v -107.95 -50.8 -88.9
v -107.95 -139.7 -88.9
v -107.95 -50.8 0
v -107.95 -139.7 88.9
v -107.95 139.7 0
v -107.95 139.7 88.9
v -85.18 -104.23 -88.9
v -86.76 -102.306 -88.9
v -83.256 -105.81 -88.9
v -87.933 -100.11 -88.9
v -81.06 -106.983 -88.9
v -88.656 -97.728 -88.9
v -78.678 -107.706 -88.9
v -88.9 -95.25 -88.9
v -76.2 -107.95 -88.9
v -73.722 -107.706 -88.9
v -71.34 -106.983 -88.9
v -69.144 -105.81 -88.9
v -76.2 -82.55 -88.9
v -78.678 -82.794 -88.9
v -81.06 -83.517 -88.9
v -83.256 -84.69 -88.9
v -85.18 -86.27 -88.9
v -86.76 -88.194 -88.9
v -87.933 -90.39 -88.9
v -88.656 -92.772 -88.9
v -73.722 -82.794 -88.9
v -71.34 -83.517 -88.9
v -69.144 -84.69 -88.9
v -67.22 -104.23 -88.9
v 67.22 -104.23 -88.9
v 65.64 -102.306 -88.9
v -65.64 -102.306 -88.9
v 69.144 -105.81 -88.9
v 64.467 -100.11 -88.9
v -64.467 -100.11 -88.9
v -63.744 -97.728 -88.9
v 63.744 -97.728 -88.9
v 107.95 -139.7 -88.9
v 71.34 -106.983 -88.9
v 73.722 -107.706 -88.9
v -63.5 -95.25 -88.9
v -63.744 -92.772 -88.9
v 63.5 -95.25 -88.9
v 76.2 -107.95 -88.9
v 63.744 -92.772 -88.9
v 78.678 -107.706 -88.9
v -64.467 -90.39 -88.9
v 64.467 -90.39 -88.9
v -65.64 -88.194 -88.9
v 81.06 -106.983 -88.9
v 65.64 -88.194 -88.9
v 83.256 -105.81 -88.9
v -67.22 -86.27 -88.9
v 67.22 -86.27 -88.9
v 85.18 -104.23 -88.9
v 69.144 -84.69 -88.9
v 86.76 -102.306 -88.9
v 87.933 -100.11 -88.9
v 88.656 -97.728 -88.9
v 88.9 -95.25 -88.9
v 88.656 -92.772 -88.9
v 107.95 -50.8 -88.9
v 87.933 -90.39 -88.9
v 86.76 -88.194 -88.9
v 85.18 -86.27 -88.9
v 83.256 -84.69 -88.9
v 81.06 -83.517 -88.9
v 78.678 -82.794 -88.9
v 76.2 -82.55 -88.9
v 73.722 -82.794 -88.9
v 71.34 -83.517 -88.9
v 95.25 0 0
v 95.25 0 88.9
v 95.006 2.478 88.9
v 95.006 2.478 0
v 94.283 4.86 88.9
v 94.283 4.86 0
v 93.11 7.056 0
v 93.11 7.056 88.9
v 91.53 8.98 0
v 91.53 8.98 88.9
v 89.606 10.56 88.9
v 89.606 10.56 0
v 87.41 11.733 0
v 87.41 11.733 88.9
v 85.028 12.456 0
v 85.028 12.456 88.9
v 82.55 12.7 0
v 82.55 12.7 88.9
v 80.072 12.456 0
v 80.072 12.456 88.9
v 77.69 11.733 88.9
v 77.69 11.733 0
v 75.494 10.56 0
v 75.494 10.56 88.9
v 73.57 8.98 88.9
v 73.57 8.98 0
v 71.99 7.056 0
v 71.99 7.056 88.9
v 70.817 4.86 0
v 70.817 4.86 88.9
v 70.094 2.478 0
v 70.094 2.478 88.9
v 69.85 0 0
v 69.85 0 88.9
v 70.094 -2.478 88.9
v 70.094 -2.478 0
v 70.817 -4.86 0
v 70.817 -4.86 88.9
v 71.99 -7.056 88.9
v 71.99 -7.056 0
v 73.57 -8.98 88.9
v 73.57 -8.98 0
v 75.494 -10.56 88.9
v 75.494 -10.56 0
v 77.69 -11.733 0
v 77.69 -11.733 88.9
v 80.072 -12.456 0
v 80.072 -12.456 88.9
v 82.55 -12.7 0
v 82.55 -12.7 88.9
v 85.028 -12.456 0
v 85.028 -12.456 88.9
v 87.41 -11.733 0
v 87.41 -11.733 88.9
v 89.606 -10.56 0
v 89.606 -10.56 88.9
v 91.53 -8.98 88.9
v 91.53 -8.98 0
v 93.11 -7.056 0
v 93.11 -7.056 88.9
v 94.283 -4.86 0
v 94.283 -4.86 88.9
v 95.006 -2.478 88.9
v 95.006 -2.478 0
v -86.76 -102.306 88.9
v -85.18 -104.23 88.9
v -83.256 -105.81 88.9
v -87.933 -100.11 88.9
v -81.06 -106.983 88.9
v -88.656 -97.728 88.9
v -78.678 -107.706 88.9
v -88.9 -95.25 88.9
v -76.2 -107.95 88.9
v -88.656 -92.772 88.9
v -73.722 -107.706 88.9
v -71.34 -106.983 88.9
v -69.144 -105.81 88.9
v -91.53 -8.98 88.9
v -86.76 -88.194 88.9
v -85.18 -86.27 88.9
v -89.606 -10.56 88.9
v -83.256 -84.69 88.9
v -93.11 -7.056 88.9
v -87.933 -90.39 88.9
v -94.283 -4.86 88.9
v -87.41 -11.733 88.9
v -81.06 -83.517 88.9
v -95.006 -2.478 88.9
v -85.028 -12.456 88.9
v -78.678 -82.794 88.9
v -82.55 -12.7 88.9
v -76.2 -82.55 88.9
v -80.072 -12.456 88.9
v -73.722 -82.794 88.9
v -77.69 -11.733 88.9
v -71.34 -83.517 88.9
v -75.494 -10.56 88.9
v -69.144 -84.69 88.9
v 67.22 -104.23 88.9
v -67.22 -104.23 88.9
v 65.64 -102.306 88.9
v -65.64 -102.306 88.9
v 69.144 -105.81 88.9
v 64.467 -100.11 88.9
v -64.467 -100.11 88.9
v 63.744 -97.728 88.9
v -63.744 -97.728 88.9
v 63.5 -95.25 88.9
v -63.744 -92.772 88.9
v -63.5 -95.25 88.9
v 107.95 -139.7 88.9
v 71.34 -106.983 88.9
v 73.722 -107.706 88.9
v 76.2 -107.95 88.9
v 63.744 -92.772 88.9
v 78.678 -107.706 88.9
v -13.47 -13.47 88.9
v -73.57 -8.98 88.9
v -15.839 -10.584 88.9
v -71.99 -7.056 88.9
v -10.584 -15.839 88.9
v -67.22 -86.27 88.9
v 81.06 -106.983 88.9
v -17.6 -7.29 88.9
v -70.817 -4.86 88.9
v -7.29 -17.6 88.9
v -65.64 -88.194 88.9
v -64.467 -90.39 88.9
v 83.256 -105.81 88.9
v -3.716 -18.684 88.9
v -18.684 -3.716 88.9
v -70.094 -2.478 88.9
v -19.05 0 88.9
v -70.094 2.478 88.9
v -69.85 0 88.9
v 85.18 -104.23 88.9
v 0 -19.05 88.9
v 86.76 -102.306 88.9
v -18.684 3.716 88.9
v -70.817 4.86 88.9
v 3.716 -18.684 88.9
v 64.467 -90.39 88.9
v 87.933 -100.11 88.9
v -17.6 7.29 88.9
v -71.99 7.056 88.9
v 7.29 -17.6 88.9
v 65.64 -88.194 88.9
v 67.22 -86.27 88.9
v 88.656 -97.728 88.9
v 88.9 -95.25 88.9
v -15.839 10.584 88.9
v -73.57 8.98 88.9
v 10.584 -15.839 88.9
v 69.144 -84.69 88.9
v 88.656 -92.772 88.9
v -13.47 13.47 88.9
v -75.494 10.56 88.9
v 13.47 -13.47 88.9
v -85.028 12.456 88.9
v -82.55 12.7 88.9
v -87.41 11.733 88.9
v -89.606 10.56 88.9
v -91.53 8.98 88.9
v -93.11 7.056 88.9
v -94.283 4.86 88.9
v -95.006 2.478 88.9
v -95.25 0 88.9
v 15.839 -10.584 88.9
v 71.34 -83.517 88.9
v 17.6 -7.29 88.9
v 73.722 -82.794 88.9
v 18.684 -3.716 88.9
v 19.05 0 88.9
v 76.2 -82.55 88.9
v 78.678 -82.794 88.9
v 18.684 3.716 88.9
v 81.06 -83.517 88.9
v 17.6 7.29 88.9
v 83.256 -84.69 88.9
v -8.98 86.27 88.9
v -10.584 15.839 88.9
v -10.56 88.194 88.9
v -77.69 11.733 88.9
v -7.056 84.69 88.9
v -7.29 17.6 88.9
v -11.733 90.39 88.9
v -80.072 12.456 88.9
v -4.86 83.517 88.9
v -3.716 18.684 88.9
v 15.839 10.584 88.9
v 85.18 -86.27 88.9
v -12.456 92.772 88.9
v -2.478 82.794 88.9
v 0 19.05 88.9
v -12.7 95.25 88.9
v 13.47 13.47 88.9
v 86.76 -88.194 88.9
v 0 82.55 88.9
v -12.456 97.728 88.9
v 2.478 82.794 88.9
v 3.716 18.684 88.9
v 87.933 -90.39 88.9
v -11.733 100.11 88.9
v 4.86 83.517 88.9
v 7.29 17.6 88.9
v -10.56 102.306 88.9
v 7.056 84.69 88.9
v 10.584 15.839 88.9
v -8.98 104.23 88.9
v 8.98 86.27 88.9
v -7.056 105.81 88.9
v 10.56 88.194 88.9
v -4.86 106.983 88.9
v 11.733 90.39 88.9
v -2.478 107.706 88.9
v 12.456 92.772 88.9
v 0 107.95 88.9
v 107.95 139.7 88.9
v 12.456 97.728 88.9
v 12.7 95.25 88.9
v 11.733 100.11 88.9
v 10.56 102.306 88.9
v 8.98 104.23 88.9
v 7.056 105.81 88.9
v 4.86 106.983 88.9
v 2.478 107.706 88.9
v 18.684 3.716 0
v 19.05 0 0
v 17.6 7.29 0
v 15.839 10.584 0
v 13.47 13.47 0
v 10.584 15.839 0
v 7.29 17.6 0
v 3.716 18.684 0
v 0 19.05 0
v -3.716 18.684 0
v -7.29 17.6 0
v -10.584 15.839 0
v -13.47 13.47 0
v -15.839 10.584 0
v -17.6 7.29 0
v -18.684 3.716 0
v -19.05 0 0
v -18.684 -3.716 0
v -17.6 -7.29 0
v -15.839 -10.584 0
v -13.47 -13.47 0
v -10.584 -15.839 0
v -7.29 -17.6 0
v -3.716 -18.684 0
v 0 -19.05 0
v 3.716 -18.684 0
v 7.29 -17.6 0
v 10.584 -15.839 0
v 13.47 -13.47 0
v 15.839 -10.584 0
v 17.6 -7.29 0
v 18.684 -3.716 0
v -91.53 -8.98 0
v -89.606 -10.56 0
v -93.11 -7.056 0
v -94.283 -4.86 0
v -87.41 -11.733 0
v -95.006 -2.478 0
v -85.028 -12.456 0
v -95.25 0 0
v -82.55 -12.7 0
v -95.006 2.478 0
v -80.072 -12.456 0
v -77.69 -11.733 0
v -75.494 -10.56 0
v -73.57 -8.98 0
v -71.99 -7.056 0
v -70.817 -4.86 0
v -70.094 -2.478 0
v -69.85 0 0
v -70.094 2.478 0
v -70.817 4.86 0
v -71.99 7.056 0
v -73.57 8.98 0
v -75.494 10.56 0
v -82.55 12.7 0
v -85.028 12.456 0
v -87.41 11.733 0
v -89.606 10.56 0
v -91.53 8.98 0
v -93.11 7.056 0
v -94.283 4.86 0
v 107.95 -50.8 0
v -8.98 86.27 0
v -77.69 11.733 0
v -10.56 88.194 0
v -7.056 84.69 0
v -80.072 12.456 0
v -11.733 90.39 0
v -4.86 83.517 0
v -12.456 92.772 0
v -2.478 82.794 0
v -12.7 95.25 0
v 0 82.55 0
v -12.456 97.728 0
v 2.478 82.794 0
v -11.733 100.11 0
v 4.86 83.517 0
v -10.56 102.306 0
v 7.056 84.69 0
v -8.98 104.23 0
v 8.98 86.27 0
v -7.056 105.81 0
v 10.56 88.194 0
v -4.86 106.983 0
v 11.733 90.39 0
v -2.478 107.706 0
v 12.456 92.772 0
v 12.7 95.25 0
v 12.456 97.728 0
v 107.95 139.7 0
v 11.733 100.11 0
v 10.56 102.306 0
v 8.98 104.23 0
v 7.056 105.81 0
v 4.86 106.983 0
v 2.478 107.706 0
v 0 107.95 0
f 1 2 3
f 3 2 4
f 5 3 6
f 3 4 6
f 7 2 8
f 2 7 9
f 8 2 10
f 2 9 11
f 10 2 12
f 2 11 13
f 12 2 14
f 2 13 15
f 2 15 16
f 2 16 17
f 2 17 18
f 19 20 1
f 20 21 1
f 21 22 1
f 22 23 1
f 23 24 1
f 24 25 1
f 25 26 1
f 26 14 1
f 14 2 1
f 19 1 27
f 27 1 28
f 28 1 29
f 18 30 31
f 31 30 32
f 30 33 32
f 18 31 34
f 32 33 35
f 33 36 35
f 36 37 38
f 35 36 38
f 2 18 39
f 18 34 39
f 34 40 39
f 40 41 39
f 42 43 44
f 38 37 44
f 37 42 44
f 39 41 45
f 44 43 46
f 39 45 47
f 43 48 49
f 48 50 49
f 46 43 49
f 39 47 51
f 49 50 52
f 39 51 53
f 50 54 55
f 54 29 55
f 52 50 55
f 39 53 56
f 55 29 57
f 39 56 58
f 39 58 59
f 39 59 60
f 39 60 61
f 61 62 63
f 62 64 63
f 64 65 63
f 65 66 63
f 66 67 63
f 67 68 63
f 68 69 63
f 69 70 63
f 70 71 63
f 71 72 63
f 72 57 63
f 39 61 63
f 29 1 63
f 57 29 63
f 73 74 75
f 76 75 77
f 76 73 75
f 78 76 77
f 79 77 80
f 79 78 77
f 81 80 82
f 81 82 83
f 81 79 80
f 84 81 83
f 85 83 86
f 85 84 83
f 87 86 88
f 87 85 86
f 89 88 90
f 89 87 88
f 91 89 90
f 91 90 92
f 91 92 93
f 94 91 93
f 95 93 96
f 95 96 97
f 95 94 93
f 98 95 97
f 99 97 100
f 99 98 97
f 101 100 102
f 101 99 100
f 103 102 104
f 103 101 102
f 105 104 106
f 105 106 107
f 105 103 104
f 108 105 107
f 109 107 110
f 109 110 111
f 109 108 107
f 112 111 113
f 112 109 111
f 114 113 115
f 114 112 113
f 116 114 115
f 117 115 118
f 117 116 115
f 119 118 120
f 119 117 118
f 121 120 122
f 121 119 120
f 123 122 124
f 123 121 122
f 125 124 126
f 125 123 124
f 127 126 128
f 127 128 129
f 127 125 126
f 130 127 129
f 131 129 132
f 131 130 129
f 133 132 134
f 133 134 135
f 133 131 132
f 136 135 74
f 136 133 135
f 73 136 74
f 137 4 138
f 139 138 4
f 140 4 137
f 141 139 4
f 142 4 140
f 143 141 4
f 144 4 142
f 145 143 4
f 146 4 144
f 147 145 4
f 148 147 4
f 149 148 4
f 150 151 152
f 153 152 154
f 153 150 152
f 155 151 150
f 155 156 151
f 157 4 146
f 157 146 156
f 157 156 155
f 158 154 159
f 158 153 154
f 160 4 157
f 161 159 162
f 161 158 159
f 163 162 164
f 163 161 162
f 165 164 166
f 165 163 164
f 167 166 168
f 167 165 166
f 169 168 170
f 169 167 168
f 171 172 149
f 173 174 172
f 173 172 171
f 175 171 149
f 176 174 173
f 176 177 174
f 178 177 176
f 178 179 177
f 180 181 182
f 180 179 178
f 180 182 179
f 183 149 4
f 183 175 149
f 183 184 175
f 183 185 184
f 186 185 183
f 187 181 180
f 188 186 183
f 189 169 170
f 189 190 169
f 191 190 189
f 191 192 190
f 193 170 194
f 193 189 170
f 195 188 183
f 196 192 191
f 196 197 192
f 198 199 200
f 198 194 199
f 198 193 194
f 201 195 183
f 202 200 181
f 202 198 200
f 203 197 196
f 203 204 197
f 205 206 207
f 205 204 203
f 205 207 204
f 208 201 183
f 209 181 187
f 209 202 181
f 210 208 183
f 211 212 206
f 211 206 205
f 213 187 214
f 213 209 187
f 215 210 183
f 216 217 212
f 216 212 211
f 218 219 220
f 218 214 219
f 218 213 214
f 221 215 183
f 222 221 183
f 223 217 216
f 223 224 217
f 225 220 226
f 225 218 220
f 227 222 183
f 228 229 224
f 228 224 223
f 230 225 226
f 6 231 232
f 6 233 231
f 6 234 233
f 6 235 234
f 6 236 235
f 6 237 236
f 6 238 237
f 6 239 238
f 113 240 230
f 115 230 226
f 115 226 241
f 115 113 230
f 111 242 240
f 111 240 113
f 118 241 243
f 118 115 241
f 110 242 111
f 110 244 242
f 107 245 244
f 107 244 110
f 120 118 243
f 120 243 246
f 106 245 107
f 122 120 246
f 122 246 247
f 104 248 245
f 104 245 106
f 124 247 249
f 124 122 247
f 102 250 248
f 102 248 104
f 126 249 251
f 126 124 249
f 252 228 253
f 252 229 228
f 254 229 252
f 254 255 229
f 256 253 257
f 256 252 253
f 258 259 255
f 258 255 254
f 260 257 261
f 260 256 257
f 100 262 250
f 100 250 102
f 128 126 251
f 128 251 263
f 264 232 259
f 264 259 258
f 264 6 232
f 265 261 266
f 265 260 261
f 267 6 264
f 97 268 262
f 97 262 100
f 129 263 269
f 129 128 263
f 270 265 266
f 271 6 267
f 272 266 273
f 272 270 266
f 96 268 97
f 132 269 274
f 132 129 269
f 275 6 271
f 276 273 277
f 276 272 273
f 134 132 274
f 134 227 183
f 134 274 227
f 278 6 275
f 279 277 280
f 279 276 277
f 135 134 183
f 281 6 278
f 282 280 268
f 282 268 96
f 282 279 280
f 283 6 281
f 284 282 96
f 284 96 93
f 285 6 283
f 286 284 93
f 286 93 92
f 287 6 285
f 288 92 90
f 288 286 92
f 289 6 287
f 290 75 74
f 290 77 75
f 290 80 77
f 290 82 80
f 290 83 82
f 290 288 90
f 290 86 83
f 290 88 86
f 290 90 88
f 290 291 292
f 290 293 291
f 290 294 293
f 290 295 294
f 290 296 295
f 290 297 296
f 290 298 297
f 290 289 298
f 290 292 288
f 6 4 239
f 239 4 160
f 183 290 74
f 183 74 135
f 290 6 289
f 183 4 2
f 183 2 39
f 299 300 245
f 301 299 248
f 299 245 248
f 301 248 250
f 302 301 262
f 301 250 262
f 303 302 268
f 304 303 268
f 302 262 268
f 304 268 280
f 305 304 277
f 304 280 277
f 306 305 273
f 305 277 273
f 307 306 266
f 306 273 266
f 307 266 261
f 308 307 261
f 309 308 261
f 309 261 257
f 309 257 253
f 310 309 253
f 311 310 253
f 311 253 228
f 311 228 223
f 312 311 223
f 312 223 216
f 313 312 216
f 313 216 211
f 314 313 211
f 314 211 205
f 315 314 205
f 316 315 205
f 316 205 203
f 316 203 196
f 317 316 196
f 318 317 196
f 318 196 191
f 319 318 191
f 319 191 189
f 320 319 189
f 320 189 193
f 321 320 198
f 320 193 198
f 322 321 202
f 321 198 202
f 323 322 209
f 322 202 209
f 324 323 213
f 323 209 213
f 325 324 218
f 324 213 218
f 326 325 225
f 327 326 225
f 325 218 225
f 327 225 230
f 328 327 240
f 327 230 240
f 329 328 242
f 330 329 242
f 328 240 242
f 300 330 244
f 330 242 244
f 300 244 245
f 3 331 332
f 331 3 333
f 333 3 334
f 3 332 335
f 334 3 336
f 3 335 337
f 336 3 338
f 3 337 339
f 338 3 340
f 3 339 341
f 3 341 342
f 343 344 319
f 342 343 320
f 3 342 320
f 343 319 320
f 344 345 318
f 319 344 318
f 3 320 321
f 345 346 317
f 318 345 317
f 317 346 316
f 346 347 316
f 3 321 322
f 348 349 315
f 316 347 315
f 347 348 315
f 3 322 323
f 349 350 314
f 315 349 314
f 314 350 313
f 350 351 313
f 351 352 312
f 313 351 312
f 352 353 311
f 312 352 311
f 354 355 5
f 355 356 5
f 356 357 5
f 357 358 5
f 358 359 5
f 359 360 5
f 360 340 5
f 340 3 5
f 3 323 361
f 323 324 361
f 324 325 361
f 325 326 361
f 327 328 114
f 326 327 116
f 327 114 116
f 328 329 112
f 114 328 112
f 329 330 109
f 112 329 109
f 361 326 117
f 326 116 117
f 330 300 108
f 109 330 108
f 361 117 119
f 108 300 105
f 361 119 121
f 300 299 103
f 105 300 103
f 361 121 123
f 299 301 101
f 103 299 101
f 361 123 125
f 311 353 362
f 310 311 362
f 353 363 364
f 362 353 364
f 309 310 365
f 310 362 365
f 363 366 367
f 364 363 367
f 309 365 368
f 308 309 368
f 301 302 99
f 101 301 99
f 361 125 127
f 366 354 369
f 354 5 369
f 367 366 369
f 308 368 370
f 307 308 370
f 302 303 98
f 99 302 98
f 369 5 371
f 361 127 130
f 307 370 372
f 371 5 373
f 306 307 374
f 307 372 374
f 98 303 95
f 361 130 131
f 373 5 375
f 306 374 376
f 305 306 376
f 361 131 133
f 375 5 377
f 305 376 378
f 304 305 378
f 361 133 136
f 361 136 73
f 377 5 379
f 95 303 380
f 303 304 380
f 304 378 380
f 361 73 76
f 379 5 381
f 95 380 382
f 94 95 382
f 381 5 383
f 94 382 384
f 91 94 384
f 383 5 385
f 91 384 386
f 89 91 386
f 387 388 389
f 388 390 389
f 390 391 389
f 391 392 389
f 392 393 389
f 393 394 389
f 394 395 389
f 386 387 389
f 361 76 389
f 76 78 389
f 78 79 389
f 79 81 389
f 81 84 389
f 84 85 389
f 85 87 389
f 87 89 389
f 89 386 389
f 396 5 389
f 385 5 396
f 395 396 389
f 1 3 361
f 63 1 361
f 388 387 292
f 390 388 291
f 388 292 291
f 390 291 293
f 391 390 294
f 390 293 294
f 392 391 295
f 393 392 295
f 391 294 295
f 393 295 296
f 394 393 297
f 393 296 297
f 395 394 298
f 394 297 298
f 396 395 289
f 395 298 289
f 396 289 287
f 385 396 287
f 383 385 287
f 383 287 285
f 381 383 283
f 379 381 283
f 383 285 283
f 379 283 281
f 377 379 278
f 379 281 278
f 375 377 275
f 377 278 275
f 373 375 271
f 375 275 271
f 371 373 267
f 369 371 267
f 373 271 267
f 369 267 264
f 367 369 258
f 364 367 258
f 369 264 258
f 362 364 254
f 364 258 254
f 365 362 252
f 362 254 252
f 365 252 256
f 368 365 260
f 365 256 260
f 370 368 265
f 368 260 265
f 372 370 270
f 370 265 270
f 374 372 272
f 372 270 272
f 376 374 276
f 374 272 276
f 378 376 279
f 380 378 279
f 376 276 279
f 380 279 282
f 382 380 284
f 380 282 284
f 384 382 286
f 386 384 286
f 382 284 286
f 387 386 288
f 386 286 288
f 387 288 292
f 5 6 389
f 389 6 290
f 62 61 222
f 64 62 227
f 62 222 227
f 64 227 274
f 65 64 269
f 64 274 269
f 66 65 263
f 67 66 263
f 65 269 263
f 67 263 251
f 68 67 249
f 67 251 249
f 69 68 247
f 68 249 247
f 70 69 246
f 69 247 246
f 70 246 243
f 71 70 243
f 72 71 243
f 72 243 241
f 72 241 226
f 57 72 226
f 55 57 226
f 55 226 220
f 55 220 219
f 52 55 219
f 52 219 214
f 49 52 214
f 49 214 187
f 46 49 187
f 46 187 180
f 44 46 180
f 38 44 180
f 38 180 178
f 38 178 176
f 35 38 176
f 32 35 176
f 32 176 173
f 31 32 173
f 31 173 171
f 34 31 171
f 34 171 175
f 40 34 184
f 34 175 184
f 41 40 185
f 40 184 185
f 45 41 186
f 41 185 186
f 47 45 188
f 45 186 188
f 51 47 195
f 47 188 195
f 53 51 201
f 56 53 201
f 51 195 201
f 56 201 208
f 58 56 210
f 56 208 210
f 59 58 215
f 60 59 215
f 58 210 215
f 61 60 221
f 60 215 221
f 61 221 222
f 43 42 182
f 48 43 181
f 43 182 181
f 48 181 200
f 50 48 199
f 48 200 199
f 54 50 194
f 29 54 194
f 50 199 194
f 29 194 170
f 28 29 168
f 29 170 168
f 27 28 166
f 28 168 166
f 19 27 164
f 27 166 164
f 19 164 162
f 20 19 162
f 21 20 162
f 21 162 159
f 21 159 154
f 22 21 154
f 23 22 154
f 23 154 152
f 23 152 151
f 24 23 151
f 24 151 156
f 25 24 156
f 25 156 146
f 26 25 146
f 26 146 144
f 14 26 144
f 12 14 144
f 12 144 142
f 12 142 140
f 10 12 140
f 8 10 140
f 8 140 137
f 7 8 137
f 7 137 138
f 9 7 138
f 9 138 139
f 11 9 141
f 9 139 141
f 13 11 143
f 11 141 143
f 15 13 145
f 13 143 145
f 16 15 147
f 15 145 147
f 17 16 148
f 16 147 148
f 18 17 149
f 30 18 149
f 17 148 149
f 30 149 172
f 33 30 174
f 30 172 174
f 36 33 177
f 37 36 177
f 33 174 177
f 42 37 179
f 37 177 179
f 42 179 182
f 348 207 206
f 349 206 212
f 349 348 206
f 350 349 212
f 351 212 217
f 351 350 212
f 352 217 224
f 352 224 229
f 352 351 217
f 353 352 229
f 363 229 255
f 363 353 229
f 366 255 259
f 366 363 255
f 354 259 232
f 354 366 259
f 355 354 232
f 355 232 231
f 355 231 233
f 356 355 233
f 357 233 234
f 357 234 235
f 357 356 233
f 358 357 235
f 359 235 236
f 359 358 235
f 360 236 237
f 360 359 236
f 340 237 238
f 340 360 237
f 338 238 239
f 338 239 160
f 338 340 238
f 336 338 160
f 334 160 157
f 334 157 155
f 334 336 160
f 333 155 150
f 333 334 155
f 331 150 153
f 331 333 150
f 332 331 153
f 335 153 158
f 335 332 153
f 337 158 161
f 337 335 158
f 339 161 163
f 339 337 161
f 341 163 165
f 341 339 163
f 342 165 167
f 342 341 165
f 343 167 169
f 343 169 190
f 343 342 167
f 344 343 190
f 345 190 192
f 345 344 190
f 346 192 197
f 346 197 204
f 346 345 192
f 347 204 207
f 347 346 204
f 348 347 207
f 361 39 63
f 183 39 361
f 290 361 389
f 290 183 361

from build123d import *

# Parameters (mm, degrees)
SKETCH1_W           = 215.9
SKETCH1_H           = 101.6
SKETCH1_R           = 12.7
SKETCH1_H_2         = 88.9
BOSS_EXTRUDE1_DEPTH = 88.9
SKETCH1_3_W         = 215.9
SKETCH1_3_H         = 88.9
BOSS_EXTRUDE2_DEPTH = 88.9
SKETCH2_W           = 215.9
SKETCH2_H           = 88.9
SKETCH2_R           = 12.7
BOSS_EXTRUDE3_DEPTH = 88.9
CUT_EXTRUDE1_REACH  = 252.564
SKETCH2_3_R         = 12.7
SKETCH2_3_R_2       = 19.05


with BuildPart() as part:
    # Sketch1 → Boss-Extrude1 (new body)
    # profile 1 of 2: a face of its own
    with BuildSketch(Plane.XY):
        Rectangle(SKETCH1_W, SKETCH1_H)
        with Locations((82.55, 0)):
            Circle(SKETCH1_R, mode=Mode.SUBTRACT)
        with Locations((-82.55, 0)):
            Circle(SKETCH1_R, mode=Mode.SUBTRACT)
    # profile 2 of 2: a face of its own
    with BuildSketch(Plane.XY):
        with Locations((0, -95.25)):
            Rectangle(SKETCH1_W, SKETCH1_H_2)
    extrude(amount=BOSS_EXTRUDE1_DEPTH)

    # Sketch1<3> → Boss-Extrude2 (add)
    with BuildSketch(Plane.XY):
        with Locations((0, -95.25)):
            Rectangle(SKETCH1_3_W, SKETCH1_3_H)
    extrude(amount=-BOSS_EXTRUDE2_DEPTH)

    # Sketch2 → Boss-Extrude3 (add)
    with BuildSketch(Plane.XY.offset(88.9)):
        with Locations((0, 95.25)):
            Rectangle(SKETCH2_W, SKETCH2_H)
        with Locations((0, 95.25)):
            Circle(SKETCH2_R, mode=Mode.SUBTRACT)
    extrude(amount=-BOSS_EXTRUDE3_DEPTH)

    # Sketch2<3> → Cut-Extrude1 (cut, up to next)
    with BuildSketch(Plane.XY.offset(88.9), mode=Mode.PRIVATE) as cut_extrude1_sk1:
        with Locations((-76.2, -95.25)):
            Circle(SKETCH2_3_R)
    cut_extrude1_tool1 = extrude(cut_extrude1_sk1.sketch, amount=-CUT_EXTRUDE1_REACH, mode=Mode.PRIVATE) & part.part
    # Sketch2<3> → Cut-Extrude1 (cut, up to next)
    with BuildSketch(Plane.XY.offset(88.9), mode=Mode.PRIVATE) as cut_extrude1_sk2:
        with Locations((76.2, -95.25)):
            Circle(SKETCH2_3_R)
    cut_extrude1_tool2 = extrude(cut_extrude1_sk2.sketch, amount=-CUT_EXTRUDE1_REACH, mode=Mode.PRIVATE) & part.part
    # Sketch2<3> → Cut-Extrude1 (cut, up to next)
    with BuildSketch(Plane.XY.offset(88.9), mode=Mode.PRIVATE) as cut_extrude1_sk3:
        Circle(SKETCH2_3_R_2)
    cut_extrude1_tool3 = extrude(cut_extrude1_sk3.sketch, amount=-CUT_EXTRUDE1_REACH, mode=Mode.PRIVATE) & part.part
    add(cut_extrude1_tool1.solids().sort_by_distance((-76.2, -95.25, 88.9))[0], mode=Mode.SUBTRACT)
    add(cut_extrude1_tool2.solids().sort_by_distance((76.2, -95.25, 88.9))[0], mode=Mode.SUBTRACT)
    add(cut_extrude1_tool3.solids().sort_by_distance((0, 0, 88.9))[0], mode=Mode.SUBTRACT)


solid = part.part
